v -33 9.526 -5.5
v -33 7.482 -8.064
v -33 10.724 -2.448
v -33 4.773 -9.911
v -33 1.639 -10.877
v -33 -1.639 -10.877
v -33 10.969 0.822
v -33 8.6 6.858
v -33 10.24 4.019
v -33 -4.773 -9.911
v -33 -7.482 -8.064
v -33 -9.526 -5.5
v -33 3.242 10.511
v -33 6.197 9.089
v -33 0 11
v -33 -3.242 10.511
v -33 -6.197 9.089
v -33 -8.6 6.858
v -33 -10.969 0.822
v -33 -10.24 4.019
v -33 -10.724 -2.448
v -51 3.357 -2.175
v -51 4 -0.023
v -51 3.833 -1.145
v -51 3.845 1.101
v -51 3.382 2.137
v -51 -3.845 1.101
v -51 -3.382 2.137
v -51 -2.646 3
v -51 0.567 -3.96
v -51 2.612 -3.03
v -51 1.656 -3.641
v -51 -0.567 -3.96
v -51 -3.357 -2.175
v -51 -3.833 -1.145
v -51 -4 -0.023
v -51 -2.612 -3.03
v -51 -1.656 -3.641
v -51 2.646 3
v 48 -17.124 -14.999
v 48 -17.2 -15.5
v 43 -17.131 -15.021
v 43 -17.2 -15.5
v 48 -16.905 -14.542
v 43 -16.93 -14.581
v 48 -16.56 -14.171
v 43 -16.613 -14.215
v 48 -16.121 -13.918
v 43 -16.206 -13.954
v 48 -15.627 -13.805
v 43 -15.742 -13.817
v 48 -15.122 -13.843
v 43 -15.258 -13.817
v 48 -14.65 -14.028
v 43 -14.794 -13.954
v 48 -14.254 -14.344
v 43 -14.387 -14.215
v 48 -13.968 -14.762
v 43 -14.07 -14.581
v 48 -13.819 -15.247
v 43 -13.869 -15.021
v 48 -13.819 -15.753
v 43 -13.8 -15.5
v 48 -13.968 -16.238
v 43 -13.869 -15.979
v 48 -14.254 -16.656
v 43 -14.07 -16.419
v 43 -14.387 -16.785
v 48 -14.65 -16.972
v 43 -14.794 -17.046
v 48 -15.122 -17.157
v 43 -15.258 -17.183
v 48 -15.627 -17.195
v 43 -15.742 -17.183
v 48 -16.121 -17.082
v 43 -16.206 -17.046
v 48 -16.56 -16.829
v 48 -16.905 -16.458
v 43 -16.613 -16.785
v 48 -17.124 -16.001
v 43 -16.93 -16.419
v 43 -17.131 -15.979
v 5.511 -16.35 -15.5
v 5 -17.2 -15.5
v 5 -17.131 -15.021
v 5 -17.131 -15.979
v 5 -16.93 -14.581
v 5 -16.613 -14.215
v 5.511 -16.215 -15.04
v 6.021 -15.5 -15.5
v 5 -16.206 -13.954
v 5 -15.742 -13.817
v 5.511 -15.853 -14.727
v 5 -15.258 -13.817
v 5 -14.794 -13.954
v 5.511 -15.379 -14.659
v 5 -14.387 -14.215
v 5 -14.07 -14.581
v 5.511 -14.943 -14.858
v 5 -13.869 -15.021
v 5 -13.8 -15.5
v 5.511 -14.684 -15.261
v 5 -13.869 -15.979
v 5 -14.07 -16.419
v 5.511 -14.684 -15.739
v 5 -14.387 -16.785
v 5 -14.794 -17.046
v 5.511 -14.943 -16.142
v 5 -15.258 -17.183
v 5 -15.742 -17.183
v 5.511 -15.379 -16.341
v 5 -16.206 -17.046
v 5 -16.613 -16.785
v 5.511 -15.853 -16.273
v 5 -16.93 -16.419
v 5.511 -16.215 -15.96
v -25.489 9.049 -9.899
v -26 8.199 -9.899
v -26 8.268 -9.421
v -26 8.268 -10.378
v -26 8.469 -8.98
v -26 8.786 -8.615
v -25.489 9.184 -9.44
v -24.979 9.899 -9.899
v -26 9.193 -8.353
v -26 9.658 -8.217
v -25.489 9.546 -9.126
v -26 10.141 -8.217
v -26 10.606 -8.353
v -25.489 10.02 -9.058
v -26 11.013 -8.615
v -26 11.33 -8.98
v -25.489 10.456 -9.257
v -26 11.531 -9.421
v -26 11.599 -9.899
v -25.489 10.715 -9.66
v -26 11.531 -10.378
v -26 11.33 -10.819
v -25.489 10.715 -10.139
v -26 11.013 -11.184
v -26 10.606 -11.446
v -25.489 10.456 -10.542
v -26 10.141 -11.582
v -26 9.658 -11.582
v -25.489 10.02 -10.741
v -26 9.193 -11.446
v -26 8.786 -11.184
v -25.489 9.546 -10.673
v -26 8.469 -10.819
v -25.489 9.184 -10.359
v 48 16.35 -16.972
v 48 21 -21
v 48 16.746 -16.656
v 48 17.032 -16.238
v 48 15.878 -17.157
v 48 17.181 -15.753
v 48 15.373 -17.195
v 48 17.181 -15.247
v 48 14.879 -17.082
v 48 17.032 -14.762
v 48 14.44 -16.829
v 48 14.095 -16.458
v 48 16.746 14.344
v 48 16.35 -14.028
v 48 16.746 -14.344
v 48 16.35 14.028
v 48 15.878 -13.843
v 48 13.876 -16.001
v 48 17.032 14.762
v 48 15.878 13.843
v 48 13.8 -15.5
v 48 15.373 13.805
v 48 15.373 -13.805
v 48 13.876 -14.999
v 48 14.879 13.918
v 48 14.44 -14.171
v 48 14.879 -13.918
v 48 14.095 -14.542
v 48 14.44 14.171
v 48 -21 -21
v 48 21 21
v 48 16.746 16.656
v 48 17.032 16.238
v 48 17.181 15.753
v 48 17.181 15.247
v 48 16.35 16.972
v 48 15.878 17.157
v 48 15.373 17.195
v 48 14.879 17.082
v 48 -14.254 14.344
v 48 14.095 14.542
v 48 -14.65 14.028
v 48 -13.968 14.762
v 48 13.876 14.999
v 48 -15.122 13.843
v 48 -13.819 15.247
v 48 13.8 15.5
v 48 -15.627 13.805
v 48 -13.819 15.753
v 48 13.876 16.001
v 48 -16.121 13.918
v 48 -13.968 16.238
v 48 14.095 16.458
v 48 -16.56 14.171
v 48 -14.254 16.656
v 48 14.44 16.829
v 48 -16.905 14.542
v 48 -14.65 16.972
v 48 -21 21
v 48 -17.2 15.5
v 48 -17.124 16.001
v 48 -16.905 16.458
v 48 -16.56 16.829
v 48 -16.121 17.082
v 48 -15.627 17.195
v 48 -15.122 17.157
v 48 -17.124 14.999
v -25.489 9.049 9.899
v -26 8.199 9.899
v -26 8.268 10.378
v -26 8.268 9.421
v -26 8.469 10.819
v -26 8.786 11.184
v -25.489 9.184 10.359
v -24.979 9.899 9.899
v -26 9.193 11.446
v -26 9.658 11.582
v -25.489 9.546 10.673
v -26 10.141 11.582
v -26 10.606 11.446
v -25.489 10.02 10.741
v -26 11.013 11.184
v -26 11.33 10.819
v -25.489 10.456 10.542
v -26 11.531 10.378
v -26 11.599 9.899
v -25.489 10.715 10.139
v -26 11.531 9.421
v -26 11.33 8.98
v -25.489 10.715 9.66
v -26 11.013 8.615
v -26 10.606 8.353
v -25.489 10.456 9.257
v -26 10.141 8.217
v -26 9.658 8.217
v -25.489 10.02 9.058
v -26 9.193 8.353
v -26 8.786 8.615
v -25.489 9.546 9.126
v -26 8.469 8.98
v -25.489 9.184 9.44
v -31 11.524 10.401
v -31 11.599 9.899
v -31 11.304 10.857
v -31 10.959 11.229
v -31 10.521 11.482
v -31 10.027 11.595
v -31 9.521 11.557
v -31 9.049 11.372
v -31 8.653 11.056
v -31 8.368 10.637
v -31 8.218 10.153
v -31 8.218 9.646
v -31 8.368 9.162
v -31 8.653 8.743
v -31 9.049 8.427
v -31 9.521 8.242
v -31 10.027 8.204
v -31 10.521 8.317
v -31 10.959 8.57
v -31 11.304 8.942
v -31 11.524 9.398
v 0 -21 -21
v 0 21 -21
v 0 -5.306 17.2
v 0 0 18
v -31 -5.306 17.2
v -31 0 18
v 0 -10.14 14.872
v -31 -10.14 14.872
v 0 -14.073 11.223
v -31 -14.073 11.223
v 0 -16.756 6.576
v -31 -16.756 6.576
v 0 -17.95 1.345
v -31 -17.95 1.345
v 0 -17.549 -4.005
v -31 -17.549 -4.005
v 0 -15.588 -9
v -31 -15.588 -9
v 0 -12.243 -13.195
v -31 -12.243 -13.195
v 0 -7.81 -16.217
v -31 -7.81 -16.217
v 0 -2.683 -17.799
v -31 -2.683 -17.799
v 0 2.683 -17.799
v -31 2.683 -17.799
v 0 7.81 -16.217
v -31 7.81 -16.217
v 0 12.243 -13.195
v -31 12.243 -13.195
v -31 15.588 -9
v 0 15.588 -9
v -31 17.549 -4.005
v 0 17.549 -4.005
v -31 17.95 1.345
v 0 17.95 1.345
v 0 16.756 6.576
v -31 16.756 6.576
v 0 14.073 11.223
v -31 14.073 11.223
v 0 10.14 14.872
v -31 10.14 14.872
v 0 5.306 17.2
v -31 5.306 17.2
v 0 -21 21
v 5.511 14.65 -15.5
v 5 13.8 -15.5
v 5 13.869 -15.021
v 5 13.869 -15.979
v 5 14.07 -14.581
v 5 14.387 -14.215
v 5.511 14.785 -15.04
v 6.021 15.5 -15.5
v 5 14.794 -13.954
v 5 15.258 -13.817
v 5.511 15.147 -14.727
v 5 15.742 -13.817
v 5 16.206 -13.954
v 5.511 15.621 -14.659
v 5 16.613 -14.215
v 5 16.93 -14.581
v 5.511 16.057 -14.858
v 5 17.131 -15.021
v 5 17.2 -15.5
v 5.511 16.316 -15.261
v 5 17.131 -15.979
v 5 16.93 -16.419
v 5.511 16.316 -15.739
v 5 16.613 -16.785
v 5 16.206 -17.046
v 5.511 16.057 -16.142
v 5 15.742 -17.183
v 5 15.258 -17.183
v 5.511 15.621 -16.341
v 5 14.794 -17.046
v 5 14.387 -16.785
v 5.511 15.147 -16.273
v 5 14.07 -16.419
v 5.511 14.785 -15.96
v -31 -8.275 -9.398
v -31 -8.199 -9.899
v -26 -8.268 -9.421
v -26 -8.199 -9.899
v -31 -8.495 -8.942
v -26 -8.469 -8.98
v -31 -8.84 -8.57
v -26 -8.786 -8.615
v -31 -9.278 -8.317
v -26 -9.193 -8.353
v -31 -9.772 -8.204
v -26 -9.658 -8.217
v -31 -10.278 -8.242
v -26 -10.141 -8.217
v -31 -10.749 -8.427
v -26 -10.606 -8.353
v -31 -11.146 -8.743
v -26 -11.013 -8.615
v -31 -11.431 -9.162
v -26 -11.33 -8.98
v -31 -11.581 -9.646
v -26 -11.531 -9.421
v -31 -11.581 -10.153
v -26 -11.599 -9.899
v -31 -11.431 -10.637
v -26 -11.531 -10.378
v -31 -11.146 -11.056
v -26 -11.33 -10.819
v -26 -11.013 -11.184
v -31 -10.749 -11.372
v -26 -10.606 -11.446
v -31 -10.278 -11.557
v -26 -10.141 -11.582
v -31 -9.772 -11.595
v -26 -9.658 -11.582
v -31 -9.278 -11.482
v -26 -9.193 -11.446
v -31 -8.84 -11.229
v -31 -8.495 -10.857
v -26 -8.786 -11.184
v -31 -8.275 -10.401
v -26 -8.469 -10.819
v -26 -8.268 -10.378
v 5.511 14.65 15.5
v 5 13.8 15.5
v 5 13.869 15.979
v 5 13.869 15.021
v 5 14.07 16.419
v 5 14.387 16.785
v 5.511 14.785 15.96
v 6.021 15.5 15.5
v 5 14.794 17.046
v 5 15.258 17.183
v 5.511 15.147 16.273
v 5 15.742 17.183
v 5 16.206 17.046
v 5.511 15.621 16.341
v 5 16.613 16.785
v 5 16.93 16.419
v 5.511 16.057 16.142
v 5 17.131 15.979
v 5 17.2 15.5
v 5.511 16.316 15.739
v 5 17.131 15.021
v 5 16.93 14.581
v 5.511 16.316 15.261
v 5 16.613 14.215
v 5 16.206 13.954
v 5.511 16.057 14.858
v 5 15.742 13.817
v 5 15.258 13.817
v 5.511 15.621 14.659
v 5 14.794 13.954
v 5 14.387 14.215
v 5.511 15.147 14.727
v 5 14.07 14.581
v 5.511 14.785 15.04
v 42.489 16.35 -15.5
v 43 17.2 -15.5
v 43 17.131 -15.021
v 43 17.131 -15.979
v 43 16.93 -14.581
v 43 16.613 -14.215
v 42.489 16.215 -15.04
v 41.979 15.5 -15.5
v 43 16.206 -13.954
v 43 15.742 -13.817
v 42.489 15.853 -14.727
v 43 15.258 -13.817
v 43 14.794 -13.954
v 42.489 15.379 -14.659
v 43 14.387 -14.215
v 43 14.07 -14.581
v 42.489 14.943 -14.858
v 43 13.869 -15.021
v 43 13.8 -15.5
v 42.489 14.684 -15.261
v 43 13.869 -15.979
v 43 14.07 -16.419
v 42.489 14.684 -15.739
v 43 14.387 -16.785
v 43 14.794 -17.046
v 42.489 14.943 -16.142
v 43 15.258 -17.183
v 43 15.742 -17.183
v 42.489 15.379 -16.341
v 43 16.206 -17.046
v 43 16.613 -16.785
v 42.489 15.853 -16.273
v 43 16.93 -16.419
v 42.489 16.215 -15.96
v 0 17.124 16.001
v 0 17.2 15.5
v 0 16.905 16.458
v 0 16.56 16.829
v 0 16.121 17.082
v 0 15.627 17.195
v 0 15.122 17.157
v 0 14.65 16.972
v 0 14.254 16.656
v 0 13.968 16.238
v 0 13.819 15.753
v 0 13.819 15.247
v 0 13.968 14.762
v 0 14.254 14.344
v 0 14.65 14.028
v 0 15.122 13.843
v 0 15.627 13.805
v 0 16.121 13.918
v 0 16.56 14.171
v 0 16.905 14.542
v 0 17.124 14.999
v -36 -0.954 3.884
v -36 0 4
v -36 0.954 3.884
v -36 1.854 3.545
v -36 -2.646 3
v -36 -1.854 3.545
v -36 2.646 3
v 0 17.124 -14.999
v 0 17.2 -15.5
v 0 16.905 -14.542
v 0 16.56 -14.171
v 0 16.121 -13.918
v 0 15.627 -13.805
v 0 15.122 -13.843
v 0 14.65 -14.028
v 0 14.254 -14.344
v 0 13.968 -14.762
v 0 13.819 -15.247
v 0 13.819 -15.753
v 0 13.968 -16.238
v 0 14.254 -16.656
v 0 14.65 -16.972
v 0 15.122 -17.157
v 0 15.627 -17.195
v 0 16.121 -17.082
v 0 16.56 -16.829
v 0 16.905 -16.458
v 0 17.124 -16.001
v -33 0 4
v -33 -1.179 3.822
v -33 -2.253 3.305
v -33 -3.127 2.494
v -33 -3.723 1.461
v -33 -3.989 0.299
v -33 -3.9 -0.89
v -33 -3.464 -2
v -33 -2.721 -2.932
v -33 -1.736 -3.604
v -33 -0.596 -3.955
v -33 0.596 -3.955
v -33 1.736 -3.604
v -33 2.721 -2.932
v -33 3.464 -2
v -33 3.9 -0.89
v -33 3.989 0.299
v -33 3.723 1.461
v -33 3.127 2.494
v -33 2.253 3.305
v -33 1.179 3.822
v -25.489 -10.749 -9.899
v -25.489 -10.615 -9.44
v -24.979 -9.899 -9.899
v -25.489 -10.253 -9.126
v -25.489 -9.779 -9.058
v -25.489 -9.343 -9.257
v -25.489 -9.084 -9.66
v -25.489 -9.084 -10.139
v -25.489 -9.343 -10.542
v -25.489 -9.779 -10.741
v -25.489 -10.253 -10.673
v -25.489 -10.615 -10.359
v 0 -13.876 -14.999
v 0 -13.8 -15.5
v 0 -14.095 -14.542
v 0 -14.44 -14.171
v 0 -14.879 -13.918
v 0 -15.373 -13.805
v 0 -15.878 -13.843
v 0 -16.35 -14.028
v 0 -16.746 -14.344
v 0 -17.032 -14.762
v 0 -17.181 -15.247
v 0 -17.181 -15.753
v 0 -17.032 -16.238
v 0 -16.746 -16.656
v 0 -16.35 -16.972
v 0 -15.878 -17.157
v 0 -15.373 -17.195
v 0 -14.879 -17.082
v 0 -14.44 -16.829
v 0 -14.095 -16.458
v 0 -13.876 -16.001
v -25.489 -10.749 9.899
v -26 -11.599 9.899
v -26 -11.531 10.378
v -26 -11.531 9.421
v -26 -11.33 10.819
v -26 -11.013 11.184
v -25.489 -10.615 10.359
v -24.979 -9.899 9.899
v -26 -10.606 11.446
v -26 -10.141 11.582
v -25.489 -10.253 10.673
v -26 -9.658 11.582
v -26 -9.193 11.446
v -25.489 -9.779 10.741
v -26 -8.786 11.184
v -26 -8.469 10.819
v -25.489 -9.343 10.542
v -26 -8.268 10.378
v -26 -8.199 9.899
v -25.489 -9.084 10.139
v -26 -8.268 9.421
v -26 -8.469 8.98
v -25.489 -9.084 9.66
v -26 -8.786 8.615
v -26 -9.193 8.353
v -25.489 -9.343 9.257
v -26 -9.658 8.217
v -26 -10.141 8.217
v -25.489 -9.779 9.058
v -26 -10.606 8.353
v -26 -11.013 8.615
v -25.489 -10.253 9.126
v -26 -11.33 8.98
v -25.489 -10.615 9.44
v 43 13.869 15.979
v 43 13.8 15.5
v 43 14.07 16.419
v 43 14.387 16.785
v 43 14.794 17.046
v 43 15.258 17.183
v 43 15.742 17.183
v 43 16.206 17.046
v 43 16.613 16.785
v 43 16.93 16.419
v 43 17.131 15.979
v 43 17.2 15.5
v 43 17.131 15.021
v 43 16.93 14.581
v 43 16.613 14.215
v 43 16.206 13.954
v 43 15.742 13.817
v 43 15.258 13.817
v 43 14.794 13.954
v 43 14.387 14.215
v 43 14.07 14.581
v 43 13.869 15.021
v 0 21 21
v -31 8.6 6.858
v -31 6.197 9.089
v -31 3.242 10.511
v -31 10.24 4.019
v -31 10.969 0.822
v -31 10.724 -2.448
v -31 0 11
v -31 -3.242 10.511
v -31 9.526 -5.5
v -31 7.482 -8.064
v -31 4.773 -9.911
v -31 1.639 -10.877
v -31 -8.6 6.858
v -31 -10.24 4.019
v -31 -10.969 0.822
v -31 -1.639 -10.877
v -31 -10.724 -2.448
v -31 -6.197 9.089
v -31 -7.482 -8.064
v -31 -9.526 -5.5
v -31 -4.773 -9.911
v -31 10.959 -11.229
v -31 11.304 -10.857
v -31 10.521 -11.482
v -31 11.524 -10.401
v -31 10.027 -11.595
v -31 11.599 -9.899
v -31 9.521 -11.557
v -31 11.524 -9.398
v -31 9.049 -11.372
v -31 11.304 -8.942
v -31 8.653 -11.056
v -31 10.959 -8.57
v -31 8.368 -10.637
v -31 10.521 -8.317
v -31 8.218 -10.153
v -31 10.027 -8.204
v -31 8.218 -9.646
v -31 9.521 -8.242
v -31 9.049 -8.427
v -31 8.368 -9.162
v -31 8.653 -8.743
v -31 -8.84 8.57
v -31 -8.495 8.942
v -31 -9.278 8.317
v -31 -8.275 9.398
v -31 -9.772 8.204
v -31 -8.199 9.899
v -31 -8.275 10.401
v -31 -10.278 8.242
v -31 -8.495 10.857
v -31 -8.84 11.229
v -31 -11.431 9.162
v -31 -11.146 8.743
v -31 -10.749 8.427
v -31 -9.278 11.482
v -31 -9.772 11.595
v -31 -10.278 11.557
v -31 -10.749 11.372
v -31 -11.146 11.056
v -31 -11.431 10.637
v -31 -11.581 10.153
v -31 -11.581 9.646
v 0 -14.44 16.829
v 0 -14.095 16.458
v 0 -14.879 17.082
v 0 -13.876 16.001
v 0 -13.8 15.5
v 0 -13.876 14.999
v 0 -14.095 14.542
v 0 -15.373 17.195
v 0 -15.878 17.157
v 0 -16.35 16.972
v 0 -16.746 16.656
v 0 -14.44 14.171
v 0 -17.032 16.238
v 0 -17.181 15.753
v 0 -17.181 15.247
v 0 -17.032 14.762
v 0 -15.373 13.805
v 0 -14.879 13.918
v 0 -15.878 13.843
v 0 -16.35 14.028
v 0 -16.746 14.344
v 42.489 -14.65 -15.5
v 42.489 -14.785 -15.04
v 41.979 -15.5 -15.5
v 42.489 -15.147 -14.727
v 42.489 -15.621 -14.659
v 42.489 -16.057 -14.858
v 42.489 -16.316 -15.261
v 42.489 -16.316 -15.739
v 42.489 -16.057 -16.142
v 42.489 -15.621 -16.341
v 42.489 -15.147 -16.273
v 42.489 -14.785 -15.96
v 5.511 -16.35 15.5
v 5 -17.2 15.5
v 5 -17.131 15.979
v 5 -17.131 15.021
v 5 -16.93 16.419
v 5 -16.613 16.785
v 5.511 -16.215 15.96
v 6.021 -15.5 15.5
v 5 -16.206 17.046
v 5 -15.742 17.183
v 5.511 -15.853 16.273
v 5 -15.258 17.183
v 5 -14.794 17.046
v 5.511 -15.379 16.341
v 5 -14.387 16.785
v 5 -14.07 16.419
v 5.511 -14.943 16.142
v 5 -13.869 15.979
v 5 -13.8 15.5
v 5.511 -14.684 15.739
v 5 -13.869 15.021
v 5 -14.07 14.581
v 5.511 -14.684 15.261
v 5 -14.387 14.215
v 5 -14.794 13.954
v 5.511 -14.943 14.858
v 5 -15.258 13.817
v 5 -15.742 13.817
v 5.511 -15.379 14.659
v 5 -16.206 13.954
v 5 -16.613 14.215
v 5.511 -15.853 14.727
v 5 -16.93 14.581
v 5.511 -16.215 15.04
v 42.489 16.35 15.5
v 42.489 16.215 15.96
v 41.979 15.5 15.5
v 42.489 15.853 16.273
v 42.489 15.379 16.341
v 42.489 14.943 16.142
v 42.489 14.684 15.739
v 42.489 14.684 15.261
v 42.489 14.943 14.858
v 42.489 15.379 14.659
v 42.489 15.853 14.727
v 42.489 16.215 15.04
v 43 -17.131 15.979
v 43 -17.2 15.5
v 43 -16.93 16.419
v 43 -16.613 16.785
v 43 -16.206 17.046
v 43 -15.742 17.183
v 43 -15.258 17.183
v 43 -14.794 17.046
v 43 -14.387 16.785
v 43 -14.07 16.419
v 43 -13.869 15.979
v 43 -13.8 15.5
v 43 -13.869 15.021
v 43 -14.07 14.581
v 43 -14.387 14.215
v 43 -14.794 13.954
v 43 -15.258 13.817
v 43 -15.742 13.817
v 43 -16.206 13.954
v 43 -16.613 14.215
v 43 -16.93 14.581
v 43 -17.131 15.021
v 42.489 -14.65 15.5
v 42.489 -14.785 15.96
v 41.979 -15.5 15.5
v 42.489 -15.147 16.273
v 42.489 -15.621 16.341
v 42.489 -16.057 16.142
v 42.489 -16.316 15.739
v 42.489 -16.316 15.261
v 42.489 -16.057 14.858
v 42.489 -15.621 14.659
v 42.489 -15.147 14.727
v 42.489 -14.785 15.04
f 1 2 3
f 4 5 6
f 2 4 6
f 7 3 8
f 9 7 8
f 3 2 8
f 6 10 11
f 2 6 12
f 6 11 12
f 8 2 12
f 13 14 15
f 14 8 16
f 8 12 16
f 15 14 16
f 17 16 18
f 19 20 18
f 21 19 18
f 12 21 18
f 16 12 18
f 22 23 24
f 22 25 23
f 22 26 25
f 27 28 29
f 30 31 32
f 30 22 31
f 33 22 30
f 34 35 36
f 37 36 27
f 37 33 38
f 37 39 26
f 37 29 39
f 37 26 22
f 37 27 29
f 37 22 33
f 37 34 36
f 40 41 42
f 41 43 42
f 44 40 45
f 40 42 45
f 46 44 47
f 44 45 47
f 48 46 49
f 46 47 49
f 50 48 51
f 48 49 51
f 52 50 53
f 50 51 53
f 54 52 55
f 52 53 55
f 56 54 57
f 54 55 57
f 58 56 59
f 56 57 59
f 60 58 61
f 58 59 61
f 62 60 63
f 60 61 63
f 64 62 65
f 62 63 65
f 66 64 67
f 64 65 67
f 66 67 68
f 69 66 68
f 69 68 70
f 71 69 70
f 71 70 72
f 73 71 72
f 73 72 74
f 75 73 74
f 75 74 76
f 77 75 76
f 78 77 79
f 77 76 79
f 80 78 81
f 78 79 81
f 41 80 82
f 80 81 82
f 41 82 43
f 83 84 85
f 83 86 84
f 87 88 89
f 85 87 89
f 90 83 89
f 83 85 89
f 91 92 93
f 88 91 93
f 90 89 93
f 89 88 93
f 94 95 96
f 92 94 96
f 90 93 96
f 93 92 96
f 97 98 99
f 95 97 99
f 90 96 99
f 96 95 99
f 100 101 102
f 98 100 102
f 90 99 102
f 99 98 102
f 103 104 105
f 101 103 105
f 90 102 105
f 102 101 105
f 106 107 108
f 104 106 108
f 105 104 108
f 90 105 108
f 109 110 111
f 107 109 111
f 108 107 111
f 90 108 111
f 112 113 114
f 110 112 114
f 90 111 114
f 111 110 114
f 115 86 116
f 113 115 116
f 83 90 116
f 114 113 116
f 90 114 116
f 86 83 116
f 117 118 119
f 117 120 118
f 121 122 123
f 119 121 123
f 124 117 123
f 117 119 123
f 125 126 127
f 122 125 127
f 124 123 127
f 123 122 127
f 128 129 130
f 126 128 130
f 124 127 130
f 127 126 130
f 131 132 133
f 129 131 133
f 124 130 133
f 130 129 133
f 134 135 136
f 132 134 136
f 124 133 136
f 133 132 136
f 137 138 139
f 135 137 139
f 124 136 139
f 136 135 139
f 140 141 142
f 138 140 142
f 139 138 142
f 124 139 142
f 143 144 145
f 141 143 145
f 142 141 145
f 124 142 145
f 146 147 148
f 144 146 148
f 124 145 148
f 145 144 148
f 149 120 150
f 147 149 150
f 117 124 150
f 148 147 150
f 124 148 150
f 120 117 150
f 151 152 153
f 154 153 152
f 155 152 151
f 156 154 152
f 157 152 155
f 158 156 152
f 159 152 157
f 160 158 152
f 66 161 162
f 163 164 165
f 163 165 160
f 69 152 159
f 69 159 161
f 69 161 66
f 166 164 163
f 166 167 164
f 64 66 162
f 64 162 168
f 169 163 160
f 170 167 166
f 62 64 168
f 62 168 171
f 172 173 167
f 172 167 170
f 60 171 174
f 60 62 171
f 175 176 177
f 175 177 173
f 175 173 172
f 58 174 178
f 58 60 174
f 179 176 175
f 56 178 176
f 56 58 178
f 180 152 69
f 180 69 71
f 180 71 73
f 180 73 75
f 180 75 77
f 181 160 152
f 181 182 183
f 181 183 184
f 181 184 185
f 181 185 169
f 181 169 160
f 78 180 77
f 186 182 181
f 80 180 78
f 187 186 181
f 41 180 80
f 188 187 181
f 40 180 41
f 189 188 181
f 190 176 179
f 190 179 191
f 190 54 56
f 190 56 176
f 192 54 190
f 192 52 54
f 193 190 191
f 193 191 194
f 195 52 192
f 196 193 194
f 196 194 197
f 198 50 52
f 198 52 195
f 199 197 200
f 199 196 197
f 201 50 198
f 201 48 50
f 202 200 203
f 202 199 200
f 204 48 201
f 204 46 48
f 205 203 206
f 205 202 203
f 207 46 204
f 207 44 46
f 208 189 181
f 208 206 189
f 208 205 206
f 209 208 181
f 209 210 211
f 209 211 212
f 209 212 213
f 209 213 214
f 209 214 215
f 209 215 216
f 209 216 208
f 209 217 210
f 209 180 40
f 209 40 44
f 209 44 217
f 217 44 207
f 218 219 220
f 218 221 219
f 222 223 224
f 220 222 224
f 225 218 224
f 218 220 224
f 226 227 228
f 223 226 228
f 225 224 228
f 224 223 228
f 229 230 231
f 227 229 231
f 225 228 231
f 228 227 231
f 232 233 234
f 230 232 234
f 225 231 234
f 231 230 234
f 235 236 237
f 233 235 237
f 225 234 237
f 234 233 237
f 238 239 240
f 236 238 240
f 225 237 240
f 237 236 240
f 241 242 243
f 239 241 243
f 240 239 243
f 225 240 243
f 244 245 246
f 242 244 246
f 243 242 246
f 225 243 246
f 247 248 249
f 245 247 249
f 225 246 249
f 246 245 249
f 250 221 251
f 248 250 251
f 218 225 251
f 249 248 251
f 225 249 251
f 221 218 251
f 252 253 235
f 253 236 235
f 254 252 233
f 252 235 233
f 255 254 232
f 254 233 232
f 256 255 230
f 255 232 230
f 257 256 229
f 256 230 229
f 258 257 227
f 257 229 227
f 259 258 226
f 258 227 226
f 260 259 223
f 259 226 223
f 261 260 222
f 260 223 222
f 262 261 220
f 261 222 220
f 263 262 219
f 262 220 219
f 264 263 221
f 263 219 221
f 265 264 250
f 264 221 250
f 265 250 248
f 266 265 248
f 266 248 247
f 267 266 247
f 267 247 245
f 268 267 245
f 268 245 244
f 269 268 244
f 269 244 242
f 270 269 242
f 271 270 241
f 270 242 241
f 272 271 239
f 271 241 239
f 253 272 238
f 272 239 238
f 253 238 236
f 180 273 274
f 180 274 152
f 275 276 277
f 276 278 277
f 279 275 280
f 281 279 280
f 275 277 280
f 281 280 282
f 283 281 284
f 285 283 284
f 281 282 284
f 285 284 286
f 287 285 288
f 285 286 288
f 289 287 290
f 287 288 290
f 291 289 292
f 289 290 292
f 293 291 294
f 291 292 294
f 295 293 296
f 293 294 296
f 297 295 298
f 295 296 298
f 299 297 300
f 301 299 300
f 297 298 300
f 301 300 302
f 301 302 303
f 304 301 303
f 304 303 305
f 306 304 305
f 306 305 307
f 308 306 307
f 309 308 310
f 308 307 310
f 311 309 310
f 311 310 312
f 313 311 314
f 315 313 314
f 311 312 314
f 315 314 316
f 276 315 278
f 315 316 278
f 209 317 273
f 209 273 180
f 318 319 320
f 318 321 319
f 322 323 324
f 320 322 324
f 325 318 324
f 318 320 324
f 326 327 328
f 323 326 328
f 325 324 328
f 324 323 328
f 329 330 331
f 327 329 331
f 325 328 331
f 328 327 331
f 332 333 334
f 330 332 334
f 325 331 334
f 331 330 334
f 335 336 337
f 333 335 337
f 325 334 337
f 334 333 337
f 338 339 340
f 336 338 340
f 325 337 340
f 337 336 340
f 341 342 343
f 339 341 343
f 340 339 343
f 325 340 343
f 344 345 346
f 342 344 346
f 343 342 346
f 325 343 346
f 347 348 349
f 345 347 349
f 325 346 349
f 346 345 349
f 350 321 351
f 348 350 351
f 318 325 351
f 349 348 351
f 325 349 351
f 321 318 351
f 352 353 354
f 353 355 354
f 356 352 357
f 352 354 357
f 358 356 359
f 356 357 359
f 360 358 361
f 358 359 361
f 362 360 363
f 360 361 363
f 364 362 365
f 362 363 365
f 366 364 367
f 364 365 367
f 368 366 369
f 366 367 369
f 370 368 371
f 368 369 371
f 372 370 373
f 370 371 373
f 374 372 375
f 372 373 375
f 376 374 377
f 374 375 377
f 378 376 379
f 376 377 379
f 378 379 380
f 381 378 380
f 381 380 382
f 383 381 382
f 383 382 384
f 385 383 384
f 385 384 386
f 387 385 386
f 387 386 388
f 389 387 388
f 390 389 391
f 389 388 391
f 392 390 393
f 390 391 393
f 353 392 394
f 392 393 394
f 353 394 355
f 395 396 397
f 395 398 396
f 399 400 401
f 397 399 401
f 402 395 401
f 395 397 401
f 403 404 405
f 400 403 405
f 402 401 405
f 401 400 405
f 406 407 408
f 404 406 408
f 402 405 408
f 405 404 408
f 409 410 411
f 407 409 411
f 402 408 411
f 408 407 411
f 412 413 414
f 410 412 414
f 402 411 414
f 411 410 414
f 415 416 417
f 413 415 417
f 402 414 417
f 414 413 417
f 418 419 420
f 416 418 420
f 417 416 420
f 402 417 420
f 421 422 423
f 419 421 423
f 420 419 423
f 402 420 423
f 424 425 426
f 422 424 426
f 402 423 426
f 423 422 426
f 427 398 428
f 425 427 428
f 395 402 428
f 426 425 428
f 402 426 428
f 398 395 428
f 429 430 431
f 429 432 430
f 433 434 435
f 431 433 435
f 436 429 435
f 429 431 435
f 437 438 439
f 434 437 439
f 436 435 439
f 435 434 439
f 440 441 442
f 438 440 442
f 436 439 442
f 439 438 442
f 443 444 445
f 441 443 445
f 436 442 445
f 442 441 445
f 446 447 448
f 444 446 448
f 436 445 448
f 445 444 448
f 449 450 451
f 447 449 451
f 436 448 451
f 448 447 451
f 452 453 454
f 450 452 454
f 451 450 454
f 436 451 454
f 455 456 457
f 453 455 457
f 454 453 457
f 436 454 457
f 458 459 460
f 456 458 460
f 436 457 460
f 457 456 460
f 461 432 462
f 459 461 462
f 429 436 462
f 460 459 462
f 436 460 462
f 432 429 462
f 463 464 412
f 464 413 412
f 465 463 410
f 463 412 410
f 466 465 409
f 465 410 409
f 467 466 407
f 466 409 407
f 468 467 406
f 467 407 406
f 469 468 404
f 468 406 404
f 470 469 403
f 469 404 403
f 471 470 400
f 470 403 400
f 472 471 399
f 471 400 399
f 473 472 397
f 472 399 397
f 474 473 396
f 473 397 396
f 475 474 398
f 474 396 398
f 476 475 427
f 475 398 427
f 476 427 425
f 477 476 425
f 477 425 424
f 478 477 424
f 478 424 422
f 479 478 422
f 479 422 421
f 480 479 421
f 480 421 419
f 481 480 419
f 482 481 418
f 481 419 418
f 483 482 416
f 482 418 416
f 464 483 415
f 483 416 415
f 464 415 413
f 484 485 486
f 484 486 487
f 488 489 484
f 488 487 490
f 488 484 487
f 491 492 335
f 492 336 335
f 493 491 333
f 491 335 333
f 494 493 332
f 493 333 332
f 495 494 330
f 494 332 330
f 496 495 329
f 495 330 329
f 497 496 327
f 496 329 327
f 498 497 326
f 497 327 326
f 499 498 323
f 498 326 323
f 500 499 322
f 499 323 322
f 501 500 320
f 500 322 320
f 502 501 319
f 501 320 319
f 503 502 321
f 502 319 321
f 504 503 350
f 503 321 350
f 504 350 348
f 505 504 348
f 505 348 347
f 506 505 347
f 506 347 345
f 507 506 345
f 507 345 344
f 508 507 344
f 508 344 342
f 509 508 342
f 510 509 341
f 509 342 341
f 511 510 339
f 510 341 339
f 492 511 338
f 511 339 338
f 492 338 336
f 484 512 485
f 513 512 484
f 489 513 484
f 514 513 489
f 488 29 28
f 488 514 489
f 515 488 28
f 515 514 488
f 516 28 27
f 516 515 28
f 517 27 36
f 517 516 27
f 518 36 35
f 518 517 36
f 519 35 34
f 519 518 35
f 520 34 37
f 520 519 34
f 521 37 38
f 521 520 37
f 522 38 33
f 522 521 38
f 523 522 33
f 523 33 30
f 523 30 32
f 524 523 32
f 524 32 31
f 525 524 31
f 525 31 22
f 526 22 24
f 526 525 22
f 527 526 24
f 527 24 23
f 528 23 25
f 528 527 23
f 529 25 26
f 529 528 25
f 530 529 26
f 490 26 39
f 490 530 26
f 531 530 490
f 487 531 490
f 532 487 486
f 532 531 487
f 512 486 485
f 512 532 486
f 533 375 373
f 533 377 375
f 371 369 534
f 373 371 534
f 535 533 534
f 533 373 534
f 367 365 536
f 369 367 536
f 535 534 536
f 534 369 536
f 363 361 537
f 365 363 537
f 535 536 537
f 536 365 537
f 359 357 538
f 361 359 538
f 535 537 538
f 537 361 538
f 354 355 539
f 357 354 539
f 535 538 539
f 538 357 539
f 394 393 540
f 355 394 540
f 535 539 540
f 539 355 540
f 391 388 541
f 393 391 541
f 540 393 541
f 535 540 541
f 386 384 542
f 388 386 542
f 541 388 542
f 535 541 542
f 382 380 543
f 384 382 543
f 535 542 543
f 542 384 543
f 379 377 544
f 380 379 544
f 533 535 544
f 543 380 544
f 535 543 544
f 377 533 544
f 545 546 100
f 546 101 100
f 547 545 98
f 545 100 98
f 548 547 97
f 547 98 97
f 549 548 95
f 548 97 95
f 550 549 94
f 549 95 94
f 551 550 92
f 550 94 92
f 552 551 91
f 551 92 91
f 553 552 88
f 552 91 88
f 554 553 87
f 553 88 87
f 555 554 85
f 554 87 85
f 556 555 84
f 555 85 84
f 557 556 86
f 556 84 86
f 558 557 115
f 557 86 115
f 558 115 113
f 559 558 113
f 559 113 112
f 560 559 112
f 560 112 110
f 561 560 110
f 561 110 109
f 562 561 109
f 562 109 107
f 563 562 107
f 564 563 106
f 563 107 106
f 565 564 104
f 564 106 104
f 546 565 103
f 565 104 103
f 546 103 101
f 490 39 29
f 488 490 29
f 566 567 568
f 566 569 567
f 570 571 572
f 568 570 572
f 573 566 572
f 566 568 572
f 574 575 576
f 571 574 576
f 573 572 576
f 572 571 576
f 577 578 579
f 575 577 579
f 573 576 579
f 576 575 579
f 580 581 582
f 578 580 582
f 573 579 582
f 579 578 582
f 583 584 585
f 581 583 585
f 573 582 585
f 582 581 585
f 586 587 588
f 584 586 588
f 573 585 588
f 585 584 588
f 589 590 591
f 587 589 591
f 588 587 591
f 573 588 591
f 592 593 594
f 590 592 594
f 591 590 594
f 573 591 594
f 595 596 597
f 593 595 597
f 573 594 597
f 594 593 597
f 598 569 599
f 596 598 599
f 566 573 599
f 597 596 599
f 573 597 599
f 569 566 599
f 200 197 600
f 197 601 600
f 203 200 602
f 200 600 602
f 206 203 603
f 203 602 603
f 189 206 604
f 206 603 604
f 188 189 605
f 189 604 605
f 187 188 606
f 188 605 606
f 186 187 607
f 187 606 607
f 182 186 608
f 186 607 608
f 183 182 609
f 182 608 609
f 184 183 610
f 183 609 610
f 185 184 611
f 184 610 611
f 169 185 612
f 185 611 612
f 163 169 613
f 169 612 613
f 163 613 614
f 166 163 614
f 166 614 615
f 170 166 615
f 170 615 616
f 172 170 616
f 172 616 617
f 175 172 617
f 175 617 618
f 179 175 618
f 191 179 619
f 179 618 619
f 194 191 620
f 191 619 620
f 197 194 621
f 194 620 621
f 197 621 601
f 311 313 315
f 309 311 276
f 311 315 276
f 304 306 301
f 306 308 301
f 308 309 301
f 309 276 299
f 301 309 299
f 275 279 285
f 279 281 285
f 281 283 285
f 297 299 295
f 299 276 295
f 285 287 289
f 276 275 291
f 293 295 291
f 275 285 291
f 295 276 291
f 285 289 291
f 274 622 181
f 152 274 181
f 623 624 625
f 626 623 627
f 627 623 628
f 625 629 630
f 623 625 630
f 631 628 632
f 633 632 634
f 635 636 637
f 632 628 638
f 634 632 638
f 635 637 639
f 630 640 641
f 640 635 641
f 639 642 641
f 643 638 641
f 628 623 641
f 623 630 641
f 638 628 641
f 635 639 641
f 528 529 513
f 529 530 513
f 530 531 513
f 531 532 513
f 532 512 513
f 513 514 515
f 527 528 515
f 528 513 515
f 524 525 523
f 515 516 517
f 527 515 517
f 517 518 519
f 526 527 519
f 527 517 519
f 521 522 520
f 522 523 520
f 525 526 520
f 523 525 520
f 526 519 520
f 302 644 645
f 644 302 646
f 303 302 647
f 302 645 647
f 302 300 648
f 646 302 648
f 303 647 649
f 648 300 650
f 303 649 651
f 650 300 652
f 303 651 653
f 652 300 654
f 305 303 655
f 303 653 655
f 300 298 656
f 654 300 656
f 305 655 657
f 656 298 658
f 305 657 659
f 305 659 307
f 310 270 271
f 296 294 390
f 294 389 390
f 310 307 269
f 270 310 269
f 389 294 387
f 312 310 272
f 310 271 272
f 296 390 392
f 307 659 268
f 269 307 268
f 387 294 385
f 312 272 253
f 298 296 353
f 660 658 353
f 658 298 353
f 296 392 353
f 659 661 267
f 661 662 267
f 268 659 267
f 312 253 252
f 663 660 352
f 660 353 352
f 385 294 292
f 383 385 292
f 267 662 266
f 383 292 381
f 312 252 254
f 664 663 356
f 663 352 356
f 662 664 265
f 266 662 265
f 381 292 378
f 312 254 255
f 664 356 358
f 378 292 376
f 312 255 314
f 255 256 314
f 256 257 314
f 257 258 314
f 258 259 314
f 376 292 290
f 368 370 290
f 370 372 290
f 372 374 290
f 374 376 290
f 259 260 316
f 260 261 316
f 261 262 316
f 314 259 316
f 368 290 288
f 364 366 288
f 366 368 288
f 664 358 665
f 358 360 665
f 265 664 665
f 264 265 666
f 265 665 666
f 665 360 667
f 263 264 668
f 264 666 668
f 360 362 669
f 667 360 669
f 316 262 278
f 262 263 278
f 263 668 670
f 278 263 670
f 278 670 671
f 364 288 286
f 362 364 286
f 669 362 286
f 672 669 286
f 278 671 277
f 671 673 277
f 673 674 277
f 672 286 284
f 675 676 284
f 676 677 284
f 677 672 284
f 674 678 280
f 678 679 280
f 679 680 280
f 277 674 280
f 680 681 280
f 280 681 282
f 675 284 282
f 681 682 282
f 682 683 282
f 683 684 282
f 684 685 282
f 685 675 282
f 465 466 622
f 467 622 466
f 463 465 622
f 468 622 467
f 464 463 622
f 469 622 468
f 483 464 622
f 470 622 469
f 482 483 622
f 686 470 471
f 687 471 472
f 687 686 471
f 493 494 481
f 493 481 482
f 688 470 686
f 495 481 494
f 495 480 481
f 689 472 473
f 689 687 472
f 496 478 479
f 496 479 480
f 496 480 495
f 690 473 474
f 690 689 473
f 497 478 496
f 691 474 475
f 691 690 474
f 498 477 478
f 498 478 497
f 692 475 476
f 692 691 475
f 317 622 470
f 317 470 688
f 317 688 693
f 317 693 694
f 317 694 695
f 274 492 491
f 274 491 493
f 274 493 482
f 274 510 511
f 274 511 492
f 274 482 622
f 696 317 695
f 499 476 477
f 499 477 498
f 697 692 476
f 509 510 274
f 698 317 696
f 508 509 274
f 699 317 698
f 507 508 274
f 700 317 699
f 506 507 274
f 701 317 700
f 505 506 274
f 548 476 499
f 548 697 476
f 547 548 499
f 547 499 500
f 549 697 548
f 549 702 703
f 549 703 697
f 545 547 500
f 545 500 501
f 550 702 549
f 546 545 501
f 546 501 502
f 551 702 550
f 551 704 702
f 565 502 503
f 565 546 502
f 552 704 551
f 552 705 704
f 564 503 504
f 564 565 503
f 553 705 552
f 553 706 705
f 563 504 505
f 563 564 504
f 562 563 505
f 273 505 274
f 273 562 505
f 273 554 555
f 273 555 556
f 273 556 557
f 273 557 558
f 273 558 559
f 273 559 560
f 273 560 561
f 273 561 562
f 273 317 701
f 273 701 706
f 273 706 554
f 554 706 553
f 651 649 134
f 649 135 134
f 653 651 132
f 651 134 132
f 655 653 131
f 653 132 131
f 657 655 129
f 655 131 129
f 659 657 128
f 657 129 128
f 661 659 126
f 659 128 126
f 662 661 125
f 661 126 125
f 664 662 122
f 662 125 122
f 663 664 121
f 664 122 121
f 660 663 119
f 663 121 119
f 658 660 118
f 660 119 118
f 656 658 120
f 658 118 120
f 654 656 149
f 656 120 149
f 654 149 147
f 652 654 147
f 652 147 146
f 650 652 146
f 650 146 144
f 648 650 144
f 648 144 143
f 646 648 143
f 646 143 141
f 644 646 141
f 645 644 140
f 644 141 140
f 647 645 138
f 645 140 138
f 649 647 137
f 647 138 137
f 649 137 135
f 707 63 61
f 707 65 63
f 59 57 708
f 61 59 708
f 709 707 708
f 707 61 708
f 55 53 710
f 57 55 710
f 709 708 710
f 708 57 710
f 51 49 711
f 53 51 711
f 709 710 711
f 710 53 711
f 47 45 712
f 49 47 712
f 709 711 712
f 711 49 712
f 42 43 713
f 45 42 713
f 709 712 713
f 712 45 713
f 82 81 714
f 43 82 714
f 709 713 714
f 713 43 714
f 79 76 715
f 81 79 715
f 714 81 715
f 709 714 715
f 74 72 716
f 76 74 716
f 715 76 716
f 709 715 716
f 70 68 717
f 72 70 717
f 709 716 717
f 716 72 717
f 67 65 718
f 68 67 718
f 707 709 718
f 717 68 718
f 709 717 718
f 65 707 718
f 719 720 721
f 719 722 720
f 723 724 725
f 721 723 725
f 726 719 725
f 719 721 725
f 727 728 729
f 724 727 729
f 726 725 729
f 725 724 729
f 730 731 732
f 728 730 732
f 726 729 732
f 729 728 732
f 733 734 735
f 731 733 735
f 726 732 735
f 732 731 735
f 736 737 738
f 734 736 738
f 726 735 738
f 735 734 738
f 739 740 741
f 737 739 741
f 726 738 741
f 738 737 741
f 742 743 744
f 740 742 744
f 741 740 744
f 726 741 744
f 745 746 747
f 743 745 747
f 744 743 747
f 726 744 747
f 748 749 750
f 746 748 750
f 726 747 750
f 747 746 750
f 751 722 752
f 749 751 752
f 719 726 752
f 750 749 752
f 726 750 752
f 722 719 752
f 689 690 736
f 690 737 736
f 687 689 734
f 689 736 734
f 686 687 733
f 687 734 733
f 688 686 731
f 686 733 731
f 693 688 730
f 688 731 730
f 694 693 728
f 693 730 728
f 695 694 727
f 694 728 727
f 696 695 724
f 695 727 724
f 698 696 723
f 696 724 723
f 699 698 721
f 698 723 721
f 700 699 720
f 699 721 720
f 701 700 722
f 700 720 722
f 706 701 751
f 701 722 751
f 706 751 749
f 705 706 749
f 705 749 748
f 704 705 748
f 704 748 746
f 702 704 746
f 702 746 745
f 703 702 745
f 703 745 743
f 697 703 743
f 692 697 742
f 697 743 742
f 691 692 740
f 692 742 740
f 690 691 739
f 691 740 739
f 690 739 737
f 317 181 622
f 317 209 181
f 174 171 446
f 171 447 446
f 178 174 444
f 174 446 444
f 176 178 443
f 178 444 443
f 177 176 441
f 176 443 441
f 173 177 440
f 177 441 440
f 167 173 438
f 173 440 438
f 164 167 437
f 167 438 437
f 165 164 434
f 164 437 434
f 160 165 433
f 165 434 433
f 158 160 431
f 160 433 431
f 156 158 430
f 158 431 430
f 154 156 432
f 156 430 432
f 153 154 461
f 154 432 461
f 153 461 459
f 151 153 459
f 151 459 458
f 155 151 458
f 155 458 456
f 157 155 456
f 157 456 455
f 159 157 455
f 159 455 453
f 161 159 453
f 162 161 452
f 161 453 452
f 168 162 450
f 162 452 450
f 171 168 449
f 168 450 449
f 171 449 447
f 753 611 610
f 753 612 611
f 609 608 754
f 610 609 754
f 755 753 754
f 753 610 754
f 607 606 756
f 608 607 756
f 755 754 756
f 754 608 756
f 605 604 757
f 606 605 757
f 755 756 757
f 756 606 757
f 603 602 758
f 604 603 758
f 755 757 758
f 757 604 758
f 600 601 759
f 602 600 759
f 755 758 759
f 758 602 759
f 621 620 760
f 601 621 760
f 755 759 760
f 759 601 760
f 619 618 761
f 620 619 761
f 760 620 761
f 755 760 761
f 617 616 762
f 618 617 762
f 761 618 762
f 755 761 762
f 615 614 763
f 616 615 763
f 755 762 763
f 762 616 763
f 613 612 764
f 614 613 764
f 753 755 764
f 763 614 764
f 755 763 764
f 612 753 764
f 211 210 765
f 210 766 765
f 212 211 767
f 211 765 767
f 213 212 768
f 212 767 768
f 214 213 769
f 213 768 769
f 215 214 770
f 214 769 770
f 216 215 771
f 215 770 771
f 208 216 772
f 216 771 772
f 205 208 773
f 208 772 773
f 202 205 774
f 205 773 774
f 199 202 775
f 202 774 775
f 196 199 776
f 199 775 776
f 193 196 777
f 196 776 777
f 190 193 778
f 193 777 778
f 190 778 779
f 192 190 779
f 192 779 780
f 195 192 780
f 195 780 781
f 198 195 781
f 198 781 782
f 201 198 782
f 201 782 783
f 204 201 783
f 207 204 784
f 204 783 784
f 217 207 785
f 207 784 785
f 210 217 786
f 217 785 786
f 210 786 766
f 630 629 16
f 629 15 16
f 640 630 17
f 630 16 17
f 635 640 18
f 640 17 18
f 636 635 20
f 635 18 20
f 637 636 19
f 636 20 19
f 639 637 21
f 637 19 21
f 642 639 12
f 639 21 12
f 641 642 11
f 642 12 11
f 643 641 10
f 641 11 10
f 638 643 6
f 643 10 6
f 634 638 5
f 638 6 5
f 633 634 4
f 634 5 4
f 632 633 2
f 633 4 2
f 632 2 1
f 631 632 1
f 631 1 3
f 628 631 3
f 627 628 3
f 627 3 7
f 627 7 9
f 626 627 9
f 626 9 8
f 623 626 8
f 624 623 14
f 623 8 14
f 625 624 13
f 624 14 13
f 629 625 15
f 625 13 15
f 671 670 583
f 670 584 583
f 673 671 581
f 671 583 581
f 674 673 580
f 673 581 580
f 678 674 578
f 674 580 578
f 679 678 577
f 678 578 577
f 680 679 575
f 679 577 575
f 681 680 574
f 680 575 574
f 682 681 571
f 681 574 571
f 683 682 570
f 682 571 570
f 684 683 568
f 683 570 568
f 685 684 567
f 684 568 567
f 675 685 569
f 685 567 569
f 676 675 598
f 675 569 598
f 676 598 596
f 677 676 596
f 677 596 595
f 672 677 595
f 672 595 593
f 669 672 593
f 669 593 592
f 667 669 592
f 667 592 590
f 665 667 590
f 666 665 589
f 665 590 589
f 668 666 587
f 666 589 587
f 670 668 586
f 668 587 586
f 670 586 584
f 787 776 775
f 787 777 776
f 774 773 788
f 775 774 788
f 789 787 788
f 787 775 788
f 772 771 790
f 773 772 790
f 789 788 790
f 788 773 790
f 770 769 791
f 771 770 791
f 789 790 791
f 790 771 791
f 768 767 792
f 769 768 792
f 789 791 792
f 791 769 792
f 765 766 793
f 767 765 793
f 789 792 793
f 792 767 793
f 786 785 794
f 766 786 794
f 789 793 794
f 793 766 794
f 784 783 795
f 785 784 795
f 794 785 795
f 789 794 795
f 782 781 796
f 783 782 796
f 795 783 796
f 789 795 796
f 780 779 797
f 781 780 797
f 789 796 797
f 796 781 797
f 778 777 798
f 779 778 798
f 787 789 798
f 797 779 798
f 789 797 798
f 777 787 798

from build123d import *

# Parameters (mm, degrees)
F1_DEPTH        = 21
F0_W            = 18
F0_H            = 4
F6_DEPTH        = 15
F10_D           = 3.4
F10_DEPTH       = 5
F10_TIP         = 1.0214630523
F10_ON_F7_D     = 3.4
F10_ON_F7_DEPTH = 5
F10_ON_F7_TIP   = 1.0214630523
F10_ON_F8_D     = 3.4
F10_ON_F8_DEPTH = 5
F10_ON_F8_TIP   = 1.0214630523


with BuildPart() as f1:
    # F0 (on Front) → F1 (new body, symmetric)
    with BuildSketch(Plane.XZ):
        Polygon((48, 21), (0, 21), (0, 18), (0, 0), (48, 0), align=None)
        Polygon((48, -21), (48, 0), (0, 0), (0, -18), (0, -21), align=None)
    extrude(amount=F1_DEPTH, both=True)

    # F10 on F7
    with Locations(Plane(origin=(0, 0, 0), x_dir=(0, -1, 0), z_dir=(-1, 0, 0))):
        with Locations((-15.5, 15.5), (15.5, 15.5), (15.5, -15.5), (-15.5, -15.5)):
            Hole(F10_ON_F7_D / 2, depth=F10_ON_F7_DEPTH)
            with Locations((0, 0, -(F10_ON_F7_DEPTH + F10_ON_F7_TIP / 2))):  # 118° drill point
                Cone(0, F10_ON_F7_D / 2, F10_ON_F7_TIP, mode=Mode.SUBTRACT)

    # F10 on F8
    with Locations(Plane.YZ.offset(48)):
        with Locations((-15.5, 15.5), (15.5, 15.5), (15.5, -15.5), (-15.5, -15.5)):
            Hole(F10_ON_F8_D / 2, depth=F10_ON_F8_DEPTH)
            with Locations((0, 0, -(F10_ON_F8_DEPTH + F10_ON_F8_TIP / 2))):  # 118° drill point
                Cone(0, F10_ON_F8_D / 2, F10_ON_F8_TIP, mode=Mode.SUBTRACT)


with BuildPart() as f2:
    # F0 (on Front) → F2 (revolve)
    with BuildSketch(Plane.XZ):
        Polygon((0, 0), (0, 18), (-31, 18), (-31, 11), (-31, 0), align=None)
    revolve(axis=Axis((48.0015884456, 0, 0), (1, 0, 0)))

    # F10
    with Locations(Plane(origin=(-31, 0, 0), x_dir=(0, -1, 0), z_dir=(-1, 0, 0))):
        with Locations((-9.8994949366, 9.8994949366), (9.8994949366, 9.8994949366), (9.8994949366, -9.8994949366), (-9.8994949366, -9.8994949366)):
            Hole(F10_D / 2, depth=F10_DEPTH)
            with Locations((0, 0, -(F10_DEPTH + F10_TIP / 2))):  # 118° drill point
                Cone(0, F10_D / 2, F10_TIP, mode=Mode.SUBTRACT)


with BuildPart() as f3:
    # F0 (on Front) → F3 (revolve)
    with BuildSketch(Plane.XZ):
        Polygon((-33, 0), (-31, 0), (-31, 11), (-33, 11), (-33, 4), align=None)
    revolve(axis=Axis((48.0015884456, 0, 0), (1, 0, 0)))


with BuildPart() as f4:
    # F0 (on Front) → F4 (revolve)
    with BuildSketch(Plane.XZ):
        with Locations((-42, 2)):
            Rectangle(F0_W, F0_H)
    revolve(axis=Axis((48.0015884456, 0, 0), (1, 0, 0)))

    # F5 (on face) → F6 (cut)
    with BuildSketch(Plane(origin=(-51, 0, 0), x_dir=(0, -1, 0), z_dir=(-1, 0, 0))):
        with BuildLine():
            ThreePointArc((2.6457513111, 3), (0, 4), (-2.6457513111, 3))
            Line((-2.6457513111, 3), (2.6457513111, 3))
        make_face()
    extrude(amount=-F6_DEPTH, mode=Mode.SUBTRACT)


solid = Compound([f1.part, f2.part, f3.part, f4.part])
